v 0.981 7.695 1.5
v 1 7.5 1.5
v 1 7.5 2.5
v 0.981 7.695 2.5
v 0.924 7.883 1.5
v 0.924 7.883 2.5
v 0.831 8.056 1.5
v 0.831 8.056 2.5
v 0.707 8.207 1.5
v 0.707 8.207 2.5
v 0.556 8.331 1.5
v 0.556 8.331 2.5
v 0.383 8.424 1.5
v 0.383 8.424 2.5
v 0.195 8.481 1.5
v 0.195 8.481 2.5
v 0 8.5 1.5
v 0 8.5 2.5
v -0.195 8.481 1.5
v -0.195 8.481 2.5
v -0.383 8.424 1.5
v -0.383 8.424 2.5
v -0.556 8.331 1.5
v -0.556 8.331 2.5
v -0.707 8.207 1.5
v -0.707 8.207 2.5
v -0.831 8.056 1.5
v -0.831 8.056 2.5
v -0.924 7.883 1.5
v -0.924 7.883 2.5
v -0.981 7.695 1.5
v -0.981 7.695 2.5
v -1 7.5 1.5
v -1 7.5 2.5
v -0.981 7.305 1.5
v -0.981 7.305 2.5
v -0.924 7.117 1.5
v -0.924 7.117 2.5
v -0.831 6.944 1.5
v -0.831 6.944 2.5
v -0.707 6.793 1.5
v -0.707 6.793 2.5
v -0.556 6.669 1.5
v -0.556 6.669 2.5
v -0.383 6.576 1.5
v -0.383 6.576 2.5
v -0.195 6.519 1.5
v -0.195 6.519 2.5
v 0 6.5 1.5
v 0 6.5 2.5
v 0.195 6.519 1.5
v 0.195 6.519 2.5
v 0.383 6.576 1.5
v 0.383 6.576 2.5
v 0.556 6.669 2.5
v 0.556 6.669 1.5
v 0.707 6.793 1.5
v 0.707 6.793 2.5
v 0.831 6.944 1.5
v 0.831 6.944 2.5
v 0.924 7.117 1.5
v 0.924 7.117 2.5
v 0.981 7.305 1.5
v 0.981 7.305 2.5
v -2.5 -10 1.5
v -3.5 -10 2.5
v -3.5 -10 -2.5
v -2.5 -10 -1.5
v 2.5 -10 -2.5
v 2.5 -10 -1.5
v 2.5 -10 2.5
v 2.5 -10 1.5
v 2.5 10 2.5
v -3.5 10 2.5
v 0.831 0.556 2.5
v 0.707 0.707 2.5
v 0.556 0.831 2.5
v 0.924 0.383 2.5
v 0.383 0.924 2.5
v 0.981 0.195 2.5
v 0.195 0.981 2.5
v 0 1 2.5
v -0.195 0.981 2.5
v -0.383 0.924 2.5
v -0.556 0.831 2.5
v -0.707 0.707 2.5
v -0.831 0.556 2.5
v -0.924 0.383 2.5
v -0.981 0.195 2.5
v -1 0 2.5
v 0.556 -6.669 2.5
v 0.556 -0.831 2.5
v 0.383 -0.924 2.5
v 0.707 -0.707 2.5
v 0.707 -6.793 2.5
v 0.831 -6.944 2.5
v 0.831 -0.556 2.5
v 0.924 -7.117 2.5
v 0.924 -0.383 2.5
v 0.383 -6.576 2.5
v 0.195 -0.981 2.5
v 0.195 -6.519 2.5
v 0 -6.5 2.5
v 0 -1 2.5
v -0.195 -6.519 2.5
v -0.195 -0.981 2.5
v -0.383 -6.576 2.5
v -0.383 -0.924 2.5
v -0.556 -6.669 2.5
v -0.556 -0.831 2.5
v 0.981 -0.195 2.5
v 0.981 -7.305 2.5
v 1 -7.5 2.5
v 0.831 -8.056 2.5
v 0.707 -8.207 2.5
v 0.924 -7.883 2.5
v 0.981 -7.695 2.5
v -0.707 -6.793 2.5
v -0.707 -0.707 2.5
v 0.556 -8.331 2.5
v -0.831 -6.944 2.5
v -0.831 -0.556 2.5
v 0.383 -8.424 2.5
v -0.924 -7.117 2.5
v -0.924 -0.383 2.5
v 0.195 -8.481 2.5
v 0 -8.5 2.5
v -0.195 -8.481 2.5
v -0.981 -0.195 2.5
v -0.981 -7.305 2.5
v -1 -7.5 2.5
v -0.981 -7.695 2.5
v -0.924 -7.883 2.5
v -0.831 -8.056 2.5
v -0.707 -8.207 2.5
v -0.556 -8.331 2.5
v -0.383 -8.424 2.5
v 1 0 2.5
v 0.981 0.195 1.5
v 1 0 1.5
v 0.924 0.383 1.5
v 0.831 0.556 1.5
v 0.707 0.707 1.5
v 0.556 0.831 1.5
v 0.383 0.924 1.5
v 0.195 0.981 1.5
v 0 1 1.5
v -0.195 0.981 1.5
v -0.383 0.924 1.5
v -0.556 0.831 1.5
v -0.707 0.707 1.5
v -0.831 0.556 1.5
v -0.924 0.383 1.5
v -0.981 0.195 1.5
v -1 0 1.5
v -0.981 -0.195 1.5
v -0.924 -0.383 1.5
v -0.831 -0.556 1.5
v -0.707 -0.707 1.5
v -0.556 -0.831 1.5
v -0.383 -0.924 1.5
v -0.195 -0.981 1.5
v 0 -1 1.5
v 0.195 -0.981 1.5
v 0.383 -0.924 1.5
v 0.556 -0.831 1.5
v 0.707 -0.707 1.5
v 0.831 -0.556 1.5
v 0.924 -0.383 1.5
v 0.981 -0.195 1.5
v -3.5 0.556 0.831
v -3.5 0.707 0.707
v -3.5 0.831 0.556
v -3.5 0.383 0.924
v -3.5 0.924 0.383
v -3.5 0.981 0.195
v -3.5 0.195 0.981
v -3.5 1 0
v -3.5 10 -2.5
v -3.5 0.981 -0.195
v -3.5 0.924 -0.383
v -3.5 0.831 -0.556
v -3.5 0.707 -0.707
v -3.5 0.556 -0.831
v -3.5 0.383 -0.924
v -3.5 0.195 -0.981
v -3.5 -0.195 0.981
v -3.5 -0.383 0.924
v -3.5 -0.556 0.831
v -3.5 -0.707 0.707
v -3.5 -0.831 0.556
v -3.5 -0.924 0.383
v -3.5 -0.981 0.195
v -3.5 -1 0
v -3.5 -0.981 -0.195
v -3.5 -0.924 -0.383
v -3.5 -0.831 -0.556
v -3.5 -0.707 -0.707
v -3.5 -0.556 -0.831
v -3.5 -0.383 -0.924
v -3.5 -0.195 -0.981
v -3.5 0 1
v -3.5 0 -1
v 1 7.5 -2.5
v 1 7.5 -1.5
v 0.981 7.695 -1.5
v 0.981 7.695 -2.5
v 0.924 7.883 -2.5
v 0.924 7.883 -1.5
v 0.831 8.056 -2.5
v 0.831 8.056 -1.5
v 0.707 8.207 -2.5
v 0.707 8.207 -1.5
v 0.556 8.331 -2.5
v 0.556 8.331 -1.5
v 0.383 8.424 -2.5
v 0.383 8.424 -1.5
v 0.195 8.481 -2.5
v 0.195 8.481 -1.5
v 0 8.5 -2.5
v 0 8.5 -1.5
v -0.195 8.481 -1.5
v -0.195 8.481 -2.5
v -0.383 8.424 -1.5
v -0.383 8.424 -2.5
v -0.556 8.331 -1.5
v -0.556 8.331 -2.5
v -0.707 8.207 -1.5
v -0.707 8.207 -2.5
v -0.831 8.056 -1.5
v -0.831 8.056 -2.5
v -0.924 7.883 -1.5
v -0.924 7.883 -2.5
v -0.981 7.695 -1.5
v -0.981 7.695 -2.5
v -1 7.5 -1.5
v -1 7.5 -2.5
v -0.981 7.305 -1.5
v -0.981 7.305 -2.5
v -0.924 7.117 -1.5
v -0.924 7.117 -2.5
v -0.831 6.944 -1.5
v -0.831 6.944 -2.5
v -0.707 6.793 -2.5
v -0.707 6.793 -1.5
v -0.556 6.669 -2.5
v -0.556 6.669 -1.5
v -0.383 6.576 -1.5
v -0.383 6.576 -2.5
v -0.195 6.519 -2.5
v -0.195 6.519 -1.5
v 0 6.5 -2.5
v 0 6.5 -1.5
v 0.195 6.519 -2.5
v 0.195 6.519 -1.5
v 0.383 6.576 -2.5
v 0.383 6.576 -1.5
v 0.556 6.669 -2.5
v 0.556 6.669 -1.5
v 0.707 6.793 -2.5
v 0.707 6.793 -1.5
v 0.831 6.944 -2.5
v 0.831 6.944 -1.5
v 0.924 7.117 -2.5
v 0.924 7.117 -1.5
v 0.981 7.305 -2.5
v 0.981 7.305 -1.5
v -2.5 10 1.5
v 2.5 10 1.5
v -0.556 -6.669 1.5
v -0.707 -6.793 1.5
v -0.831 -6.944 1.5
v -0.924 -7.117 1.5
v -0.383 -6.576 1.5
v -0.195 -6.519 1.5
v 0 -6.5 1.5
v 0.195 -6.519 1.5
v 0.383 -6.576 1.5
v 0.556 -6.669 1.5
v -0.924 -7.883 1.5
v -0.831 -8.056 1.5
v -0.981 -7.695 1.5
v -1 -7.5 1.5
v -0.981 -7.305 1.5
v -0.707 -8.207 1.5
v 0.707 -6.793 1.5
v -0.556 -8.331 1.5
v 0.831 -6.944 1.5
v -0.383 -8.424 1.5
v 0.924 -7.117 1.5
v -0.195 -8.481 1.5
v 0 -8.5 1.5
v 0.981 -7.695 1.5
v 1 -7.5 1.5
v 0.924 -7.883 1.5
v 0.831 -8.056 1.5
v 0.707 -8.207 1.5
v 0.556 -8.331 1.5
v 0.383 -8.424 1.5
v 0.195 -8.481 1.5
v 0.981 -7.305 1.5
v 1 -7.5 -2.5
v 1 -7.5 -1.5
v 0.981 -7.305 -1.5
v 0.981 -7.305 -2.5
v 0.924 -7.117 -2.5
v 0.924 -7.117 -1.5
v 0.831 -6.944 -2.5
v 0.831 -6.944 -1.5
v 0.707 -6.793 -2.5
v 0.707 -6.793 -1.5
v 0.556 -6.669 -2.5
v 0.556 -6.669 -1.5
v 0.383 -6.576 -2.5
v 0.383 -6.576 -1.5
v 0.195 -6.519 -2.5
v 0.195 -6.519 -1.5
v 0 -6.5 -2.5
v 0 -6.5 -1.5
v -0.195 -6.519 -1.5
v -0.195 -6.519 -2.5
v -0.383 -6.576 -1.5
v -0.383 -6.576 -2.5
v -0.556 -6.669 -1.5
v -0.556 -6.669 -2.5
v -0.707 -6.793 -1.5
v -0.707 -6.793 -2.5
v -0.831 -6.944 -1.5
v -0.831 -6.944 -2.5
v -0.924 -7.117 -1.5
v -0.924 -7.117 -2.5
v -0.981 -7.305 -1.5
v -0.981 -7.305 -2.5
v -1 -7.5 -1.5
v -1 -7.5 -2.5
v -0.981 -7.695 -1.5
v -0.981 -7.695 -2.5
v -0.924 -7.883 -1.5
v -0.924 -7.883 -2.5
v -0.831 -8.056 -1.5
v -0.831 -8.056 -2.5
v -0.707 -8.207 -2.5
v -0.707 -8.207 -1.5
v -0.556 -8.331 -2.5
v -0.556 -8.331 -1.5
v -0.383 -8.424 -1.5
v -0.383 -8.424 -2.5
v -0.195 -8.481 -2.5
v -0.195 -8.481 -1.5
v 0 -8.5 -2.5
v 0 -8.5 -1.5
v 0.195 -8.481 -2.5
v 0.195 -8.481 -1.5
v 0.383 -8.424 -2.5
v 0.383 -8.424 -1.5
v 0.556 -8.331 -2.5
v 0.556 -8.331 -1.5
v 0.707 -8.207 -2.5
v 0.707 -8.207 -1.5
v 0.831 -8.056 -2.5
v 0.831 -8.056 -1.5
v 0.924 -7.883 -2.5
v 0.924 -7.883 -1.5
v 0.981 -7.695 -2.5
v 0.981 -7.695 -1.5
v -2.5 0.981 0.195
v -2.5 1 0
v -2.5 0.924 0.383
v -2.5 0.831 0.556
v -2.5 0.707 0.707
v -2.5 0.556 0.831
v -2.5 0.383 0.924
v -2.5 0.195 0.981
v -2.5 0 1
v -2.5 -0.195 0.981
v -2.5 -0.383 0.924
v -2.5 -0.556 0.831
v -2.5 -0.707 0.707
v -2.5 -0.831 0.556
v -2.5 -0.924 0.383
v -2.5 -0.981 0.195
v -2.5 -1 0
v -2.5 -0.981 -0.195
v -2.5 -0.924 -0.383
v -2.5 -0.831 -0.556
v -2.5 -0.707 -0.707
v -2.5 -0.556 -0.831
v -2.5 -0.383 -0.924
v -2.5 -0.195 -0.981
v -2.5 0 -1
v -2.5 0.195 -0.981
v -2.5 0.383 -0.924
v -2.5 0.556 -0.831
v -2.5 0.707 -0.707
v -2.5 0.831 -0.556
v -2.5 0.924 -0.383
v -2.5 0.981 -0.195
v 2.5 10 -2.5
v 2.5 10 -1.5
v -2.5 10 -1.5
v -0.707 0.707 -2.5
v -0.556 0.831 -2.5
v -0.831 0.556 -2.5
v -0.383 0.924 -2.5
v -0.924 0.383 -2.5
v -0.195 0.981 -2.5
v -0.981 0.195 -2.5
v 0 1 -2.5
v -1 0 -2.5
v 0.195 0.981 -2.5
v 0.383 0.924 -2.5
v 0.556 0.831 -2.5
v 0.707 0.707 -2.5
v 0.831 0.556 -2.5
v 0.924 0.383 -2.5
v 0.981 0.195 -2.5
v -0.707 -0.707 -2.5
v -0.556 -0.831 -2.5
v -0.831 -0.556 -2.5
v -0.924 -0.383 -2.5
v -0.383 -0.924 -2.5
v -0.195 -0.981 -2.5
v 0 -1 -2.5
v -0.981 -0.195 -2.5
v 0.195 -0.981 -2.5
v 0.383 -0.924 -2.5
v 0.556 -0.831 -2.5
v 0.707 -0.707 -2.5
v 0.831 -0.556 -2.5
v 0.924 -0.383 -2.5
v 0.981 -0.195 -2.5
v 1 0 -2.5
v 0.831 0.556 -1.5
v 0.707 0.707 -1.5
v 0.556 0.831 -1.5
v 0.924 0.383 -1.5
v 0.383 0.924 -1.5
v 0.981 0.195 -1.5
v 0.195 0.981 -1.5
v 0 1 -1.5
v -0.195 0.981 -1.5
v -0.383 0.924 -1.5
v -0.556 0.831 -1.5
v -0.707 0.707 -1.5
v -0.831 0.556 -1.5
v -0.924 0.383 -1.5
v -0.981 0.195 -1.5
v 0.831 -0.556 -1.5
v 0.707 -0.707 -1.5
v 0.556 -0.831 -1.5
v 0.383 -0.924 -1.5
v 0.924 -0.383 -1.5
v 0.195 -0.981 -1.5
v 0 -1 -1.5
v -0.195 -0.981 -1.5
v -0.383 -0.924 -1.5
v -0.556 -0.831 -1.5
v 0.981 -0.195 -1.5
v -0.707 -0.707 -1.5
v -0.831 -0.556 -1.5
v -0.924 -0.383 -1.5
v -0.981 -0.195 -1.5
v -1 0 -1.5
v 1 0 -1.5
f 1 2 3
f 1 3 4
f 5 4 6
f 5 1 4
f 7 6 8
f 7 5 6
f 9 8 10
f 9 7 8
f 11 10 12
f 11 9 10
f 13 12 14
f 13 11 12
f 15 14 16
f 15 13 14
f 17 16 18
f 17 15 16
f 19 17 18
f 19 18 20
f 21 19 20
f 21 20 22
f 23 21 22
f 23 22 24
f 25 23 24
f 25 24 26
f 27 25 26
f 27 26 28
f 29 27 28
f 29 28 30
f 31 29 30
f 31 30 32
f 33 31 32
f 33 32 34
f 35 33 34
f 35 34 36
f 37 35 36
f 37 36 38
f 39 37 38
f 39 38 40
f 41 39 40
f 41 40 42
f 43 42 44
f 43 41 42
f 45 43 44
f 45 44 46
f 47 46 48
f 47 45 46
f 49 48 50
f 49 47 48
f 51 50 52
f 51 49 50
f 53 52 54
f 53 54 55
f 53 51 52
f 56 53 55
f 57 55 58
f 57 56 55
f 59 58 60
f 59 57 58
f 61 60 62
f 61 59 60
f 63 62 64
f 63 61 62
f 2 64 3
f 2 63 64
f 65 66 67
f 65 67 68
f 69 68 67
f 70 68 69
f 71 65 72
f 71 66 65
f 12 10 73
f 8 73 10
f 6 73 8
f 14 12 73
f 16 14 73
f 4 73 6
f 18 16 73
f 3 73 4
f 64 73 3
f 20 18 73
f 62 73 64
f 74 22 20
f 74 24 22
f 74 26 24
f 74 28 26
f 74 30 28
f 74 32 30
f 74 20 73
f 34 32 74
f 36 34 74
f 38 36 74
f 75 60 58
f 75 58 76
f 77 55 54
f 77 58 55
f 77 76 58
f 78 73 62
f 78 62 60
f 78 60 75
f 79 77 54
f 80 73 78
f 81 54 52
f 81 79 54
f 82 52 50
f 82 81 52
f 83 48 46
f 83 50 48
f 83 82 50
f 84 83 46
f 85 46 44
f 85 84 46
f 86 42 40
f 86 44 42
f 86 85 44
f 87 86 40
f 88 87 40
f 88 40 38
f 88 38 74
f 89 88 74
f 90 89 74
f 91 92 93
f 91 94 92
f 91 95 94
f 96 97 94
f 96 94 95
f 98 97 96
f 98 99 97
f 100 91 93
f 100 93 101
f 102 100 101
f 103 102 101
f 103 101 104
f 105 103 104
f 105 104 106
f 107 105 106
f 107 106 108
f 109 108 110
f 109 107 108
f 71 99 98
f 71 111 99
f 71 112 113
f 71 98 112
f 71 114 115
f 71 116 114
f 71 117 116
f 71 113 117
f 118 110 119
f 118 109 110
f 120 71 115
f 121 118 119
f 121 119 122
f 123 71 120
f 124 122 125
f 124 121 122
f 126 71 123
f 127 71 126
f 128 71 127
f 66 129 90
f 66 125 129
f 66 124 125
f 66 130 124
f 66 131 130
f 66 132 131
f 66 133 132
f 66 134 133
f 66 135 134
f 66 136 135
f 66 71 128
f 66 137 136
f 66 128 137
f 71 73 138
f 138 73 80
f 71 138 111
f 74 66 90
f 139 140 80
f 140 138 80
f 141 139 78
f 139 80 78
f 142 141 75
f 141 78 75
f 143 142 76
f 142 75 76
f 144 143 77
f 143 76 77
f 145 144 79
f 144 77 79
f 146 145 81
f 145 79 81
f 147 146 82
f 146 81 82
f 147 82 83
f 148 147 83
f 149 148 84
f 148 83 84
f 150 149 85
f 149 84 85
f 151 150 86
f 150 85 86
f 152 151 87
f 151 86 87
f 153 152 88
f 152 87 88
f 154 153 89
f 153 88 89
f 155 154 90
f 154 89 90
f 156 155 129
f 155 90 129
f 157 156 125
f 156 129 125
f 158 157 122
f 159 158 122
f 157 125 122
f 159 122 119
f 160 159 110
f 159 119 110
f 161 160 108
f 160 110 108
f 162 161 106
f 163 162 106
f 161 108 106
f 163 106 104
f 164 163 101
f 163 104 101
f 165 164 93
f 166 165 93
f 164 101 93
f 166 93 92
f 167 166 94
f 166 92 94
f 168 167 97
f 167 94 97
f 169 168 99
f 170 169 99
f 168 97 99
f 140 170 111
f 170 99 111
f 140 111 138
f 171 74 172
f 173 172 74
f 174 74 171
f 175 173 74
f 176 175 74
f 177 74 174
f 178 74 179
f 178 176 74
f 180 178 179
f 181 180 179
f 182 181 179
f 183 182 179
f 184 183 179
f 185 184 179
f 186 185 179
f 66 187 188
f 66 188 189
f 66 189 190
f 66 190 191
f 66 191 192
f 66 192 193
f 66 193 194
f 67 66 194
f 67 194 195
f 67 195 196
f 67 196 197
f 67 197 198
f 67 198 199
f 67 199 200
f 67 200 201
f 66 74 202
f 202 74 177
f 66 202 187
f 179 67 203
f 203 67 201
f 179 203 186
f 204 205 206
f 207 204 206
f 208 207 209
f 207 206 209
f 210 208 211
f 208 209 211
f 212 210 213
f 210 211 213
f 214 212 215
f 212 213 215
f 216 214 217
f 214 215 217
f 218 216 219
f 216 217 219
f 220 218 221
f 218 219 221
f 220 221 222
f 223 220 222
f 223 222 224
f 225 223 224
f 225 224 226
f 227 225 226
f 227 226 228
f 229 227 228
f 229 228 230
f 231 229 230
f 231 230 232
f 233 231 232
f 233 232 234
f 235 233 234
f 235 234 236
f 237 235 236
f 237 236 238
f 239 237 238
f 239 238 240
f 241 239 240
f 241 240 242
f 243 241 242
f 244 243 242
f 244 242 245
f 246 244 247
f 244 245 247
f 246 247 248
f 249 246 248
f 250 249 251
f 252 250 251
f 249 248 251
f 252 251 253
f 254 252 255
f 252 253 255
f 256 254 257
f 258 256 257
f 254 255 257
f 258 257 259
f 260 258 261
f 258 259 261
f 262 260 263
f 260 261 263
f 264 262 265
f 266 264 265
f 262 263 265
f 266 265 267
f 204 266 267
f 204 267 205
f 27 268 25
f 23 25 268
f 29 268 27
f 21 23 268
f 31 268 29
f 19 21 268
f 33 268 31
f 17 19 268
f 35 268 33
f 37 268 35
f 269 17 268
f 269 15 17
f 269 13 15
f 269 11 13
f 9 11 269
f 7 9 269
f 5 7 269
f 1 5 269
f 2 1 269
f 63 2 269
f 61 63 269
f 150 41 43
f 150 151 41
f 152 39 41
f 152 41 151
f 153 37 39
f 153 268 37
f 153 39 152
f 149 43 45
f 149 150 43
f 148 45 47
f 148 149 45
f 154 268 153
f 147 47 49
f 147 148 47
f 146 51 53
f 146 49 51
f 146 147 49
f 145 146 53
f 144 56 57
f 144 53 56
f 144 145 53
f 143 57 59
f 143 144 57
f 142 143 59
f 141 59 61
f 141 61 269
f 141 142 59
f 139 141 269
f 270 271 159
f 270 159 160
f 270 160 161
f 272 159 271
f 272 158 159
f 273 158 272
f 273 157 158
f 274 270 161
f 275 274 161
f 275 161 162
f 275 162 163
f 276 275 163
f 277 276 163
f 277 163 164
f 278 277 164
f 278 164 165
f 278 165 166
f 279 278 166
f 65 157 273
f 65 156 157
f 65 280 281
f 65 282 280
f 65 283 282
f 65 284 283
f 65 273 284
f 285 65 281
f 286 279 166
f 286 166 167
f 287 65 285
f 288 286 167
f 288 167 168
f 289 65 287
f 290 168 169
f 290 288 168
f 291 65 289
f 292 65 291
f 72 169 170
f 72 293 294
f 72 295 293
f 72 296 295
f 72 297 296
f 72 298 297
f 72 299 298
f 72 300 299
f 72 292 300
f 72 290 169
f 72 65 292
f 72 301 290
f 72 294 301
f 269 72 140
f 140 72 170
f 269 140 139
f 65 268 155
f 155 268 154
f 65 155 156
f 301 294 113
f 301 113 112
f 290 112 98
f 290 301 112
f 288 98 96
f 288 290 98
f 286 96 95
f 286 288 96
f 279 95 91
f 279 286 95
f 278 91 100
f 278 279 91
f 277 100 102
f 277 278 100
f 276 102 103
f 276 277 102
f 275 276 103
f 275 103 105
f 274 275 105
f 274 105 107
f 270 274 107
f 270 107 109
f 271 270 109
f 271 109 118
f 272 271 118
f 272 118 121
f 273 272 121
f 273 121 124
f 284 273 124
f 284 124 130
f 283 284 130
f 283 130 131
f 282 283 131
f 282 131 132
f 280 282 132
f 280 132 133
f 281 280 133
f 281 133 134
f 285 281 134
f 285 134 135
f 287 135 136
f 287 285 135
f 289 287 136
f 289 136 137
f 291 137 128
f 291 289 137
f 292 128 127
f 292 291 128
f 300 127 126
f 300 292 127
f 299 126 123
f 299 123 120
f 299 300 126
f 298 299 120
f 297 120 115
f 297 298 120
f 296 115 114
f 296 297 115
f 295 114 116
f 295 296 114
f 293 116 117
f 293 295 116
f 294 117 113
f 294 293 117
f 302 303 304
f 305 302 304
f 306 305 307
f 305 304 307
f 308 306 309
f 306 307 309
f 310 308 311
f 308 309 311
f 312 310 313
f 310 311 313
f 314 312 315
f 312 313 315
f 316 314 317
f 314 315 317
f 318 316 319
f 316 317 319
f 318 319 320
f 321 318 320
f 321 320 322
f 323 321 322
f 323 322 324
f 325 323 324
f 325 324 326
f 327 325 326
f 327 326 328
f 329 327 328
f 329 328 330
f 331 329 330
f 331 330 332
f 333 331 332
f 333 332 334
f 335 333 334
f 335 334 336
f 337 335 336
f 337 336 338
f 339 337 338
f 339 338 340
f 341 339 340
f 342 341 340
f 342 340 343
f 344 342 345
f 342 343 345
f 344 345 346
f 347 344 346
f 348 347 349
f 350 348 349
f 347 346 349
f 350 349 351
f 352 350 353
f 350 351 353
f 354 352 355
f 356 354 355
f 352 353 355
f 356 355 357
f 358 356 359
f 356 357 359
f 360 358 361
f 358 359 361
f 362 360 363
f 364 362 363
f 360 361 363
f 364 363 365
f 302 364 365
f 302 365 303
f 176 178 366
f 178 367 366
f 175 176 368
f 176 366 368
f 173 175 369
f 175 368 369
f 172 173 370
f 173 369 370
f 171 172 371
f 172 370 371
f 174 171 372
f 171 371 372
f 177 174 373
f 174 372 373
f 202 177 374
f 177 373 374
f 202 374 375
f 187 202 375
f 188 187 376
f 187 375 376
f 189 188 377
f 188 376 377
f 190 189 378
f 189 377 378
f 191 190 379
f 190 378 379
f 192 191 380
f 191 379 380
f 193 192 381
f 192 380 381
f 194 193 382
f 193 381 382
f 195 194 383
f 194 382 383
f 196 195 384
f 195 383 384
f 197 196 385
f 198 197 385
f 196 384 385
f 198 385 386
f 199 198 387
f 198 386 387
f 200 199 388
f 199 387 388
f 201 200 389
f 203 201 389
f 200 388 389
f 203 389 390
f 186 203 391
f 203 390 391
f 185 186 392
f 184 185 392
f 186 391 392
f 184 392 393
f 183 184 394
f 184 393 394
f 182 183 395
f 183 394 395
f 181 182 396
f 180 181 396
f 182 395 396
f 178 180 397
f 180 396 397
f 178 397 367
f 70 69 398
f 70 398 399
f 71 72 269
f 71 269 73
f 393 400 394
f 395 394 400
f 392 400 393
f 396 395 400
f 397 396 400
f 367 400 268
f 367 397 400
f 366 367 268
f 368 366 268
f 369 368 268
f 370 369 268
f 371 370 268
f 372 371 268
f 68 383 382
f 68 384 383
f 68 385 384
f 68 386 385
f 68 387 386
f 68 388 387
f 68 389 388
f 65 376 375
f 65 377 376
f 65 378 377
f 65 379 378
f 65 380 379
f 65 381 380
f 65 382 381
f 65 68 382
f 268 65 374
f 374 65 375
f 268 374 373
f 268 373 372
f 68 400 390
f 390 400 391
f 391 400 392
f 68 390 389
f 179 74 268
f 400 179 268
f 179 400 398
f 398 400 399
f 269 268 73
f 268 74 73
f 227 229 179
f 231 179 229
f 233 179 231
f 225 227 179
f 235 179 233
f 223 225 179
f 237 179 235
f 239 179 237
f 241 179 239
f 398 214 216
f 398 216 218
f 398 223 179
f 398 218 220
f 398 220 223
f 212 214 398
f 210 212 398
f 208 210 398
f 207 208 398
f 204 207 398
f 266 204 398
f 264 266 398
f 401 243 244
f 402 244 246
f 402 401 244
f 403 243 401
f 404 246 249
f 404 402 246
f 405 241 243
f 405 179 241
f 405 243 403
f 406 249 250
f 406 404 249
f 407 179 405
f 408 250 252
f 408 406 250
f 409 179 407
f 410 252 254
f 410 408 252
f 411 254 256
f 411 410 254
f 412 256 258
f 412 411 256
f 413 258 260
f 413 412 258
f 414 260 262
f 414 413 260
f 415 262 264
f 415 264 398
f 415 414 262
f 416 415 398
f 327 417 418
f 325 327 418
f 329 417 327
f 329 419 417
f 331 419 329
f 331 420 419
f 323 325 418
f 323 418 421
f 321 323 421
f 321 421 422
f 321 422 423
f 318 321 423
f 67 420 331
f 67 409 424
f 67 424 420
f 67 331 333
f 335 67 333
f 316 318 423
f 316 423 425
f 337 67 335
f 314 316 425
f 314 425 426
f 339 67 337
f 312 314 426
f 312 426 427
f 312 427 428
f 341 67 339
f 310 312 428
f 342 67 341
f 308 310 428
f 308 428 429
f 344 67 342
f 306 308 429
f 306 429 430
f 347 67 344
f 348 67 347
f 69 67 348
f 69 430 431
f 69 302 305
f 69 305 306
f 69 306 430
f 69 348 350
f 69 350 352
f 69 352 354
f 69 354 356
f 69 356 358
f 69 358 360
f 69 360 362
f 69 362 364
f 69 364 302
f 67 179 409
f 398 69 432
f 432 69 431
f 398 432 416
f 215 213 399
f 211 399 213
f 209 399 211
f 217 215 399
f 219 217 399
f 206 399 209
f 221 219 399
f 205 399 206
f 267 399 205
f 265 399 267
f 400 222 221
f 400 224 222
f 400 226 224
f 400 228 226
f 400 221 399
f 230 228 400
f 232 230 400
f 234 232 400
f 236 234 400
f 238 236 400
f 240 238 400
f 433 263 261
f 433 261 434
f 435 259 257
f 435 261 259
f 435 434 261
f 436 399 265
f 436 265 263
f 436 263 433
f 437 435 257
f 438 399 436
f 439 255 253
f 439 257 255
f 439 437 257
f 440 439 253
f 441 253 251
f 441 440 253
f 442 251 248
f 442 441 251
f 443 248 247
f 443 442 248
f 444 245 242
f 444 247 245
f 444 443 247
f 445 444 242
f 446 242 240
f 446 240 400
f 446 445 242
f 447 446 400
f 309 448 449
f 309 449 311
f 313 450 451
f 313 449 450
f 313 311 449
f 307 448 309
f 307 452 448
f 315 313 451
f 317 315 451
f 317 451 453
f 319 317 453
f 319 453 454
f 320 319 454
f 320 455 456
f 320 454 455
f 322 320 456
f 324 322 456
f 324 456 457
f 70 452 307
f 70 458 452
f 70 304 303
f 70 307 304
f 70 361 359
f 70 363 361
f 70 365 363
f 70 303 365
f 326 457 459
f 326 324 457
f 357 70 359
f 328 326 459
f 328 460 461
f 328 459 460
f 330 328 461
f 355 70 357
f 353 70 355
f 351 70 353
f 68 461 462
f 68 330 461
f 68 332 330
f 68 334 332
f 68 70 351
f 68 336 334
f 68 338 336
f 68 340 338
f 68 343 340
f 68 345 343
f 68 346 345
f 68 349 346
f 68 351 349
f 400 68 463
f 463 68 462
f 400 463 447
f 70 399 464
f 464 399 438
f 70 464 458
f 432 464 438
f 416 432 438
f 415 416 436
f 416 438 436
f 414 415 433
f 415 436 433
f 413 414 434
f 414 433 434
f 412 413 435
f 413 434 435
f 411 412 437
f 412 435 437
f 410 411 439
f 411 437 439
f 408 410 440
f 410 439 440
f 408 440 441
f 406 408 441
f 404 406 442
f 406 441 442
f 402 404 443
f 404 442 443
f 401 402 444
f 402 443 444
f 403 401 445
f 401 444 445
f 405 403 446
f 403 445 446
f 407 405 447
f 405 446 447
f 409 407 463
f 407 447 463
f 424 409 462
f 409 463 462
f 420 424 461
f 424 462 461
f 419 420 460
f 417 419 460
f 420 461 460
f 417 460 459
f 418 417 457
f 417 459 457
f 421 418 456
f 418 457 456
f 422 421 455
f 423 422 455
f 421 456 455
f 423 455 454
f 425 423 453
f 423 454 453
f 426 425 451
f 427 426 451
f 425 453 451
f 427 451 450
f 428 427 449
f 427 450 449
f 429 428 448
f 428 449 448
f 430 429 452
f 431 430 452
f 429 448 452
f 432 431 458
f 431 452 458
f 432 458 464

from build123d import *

# Parameters (mm, degrees)
F1_DEPTH = 10
F2_R     = 1
F3_DEPTH = 2.5
F4_R     = 1
F5_DEPTH = 5


with BuildPart() as f1:
    # F0 (on Front) → F1 (new body, symmetric)
    with BuildSketch(Plane.XZ):
        Polygon((-2.5, 1.5), (2.5, 1.5), (2.5, 2.5), (-3.5, 2.5), (-3.5, -2.5), (2.5, -2.5), (2.5, -1.5), (-2.5, -1.5), align=None)
    extrude(amount=F1_DEPTH, both=True)

    # F2 (on Top) → F3 (cut, symmetric)
    with BuildSketch(Plane.XY):
        with Locations((0, 7.5)):
            Circle(F2_R)
        with Locations((0, -7.5)):
            Circle(F2_R)
        Circle(F2_R)
    extrude(amount=F3_DEPTH, both=True, mode=Mode.SUBTRACT)

    # F4 (on Right) → F5 (cut, symmetric)
    with BuildSketch(Plane.YZ):
        Circle(F4_R)
    extrude(amount=F5_DEPTH, both=True, mode=Mode.SUBTRACT)


solid = f1.part
